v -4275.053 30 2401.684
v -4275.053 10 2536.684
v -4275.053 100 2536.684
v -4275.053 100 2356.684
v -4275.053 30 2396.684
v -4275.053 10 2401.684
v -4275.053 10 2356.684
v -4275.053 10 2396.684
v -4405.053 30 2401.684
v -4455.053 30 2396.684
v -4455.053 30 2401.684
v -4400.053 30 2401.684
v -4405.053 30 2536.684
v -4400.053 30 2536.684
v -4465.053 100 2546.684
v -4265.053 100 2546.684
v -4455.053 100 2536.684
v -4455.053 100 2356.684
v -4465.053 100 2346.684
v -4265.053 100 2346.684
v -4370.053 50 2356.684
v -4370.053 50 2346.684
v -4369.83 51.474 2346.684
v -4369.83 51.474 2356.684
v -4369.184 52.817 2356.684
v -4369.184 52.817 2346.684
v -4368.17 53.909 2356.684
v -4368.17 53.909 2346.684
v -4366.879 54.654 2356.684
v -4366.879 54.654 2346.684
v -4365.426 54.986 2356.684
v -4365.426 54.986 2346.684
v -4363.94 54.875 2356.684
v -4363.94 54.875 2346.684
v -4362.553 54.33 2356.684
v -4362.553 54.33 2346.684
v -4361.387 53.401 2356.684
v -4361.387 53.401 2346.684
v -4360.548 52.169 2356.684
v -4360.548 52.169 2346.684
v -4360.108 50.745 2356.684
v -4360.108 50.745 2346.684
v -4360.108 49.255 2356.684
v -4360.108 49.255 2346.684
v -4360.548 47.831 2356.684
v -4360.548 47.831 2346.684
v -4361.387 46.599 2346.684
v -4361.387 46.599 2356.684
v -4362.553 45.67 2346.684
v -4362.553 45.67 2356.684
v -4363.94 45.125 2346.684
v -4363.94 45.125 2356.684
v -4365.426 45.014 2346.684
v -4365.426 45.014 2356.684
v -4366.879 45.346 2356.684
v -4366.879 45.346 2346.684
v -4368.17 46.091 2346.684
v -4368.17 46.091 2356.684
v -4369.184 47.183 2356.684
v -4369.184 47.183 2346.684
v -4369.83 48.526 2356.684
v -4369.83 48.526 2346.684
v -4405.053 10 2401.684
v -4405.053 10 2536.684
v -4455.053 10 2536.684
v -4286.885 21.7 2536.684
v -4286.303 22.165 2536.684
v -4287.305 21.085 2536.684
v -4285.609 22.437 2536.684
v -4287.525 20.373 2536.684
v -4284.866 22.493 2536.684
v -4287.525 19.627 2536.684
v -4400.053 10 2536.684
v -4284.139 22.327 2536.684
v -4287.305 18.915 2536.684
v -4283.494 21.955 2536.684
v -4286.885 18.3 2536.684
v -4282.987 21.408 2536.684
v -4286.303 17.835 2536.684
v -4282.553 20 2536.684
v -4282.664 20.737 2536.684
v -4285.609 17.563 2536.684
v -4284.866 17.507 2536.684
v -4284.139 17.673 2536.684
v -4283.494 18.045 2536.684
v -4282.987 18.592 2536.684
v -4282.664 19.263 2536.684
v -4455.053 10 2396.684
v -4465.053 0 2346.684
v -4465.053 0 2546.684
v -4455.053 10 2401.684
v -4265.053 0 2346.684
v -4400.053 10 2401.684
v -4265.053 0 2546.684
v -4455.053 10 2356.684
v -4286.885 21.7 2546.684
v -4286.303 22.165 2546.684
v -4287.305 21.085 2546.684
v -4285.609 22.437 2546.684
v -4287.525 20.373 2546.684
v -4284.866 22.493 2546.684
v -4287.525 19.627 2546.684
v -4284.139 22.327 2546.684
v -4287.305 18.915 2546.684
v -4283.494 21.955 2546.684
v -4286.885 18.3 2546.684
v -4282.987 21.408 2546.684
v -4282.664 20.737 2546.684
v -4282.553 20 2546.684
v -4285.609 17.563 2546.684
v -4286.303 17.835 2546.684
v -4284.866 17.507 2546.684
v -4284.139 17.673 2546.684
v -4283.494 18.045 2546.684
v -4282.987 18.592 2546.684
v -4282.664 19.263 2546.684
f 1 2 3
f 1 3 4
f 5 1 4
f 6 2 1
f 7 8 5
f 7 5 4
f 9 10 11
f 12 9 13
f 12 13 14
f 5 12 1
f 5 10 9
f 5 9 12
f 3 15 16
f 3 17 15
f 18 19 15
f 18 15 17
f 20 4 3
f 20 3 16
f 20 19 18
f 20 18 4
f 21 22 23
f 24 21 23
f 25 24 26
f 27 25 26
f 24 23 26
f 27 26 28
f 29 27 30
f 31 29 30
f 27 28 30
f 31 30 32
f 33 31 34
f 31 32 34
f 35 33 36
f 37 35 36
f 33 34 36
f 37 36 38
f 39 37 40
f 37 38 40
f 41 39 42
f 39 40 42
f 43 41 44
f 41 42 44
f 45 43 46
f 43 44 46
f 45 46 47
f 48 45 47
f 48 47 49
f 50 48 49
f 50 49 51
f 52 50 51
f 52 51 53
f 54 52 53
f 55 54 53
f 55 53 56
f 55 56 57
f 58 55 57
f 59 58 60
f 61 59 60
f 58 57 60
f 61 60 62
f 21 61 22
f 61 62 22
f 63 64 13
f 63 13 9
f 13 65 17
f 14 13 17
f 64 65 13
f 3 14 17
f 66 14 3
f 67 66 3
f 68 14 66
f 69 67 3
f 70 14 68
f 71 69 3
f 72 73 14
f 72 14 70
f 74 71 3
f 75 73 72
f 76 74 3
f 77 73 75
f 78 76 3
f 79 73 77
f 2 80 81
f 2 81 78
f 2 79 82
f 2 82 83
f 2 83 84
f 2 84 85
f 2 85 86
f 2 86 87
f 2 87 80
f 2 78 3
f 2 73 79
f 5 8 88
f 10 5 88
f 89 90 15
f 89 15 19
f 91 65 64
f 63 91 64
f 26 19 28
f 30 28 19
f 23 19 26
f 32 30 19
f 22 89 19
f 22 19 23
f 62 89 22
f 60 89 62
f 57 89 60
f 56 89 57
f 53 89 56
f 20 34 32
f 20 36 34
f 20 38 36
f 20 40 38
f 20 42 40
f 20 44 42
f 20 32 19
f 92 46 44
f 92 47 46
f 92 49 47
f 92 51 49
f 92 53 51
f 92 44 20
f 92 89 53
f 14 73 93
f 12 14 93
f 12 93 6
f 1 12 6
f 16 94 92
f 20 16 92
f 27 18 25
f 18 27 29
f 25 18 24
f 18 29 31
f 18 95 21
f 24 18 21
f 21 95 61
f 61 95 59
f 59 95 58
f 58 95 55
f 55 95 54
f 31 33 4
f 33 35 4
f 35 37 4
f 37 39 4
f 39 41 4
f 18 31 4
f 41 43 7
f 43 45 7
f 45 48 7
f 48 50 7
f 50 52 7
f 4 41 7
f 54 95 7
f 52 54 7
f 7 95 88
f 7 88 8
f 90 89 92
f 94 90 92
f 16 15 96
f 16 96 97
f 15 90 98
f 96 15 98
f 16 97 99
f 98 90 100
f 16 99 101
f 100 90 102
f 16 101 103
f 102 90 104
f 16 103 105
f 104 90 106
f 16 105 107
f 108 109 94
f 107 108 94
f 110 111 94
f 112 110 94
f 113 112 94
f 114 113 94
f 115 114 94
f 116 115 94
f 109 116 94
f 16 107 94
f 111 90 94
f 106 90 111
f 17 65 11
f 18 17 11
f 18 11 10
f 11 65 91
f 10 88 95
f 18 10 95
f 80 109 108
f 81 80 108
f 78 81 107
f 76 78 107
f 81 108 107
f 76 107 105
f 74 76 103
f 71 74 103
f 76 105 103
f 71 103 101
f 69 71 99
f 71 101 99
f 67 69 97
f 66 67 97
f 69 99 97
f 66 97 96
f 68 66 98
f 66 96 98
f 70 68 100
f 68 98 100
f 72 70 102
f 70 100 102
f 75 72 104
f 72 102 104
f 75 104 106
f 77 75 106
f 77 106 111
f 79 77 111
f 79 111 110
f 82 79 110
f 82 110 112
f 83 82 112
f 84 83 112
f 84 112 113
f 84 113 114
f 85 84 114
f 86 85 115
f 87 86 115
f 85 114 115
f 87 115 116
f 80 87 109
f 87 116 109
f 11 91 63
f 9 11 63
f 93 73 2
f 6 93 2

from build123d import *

# Parameters (mm, degrees)
SKETCH1_W           = 200
SKETCH1_H           = 200
SKETCH1_W_2         = 180
SKETCH1_H_2         = 180
BOSS_EXTRUDE1_DEPTH = 100
SKETCH2_W           = 200
SKETCH2_H           = 200
BOSS_EXTRUDE2_DEPTH = 10
SKETCH3_R           = 5
CUT_EXTRUDE1_DEPTH  = 10
SKETCH4_W           = 5
SKETCH4_H           = 135
BOSS_EXTRUDE3_DEPTH = 20
SKETCH6_R           = 2.5
CUT_EXTRUDE2_DEPTH  = 10


with BuildPart() as part:
    # Sketch1 → Boss-Extrude1 (new body)
    with BuildSketch(Plane(origin=(0, 0, 0), x_dir=(1, 0, 0), z_dir=(0, 1, 0))):
        with Locations((-4365.052631579, -2446.684210526)):
            Rectangle(SKETCH1_W, SKETCH1_H)
        with Locations((-4365.052631579, -2446.684210526)):
            Rectangle(SKETCH1_W_2, SKETCH1_H_2, mode=Mode.SUBTRACT)
    extrude(amount=BOSS_EXTRUDE1_DEPTH)

    # Sketch2 → Boss-Extrude2 (add)
    with BuildSketch(Plane(origin=(0, 0, 0), x_dir=(1, 0, 0), z_dir=(0, 1, 0))):
        with Locations((-4365.052631579, -2446.684210526)):
            Rectangle(SKETCH2_W, SKETCH2_H)
    extrude(amount=BOSS_EXTRUDE2_DEPTH)

    # Sketch3 → Cut-Extrude1 (cut)
    with BuildSketch(Plane(origin=(0, 0, 2346.684210526), x_dir=(-1, 0, 0), z_dir=(0, 0, -1))):
        with Locations((4365.052631579, 50)):
            Circle(SKETCH3_R)
    extrude(amount=-CUT_EXTRUDE1_DEPTH, mode=Mode.SUBTRACT)

    # Sketch4 → Boss-Extrude3 (add)
    with BuildSketch(Plane(origin=(0, 10, 0), x_dir=(1, 0, 0), z_dir=(0, 1, 0))):
        with Locations((-4402.552631579, -2469.184210526)):
            Rectangle(SKETCH4_W, SKETCH4_H)
        Polygon((-4275.052631579, -2396.684210526), (-4455.052631579, -2396.684210526), (-4455.052631579, -2401.684210526), (-4405.052631579, -2401.684210526), (-4400.052631579, -2401.684210526), (-4275.052631579, -2401.684210526), align=None)
    extrude(amount=BOSS_EXTRUDE3_DEPTH)

    # Sketch6 → Cut-Extrude2 (cut)
    with BuildSketch(Plane.XY.offset(2546.684210526)):
        with Locations((-4285.052631579, 20)):
            Circle(SKETCH6_R)
    extrude(amount=-CUT_EXTRUDE2_DEPTH, mode=Mode.SUBTRACT)


solid = part.part
